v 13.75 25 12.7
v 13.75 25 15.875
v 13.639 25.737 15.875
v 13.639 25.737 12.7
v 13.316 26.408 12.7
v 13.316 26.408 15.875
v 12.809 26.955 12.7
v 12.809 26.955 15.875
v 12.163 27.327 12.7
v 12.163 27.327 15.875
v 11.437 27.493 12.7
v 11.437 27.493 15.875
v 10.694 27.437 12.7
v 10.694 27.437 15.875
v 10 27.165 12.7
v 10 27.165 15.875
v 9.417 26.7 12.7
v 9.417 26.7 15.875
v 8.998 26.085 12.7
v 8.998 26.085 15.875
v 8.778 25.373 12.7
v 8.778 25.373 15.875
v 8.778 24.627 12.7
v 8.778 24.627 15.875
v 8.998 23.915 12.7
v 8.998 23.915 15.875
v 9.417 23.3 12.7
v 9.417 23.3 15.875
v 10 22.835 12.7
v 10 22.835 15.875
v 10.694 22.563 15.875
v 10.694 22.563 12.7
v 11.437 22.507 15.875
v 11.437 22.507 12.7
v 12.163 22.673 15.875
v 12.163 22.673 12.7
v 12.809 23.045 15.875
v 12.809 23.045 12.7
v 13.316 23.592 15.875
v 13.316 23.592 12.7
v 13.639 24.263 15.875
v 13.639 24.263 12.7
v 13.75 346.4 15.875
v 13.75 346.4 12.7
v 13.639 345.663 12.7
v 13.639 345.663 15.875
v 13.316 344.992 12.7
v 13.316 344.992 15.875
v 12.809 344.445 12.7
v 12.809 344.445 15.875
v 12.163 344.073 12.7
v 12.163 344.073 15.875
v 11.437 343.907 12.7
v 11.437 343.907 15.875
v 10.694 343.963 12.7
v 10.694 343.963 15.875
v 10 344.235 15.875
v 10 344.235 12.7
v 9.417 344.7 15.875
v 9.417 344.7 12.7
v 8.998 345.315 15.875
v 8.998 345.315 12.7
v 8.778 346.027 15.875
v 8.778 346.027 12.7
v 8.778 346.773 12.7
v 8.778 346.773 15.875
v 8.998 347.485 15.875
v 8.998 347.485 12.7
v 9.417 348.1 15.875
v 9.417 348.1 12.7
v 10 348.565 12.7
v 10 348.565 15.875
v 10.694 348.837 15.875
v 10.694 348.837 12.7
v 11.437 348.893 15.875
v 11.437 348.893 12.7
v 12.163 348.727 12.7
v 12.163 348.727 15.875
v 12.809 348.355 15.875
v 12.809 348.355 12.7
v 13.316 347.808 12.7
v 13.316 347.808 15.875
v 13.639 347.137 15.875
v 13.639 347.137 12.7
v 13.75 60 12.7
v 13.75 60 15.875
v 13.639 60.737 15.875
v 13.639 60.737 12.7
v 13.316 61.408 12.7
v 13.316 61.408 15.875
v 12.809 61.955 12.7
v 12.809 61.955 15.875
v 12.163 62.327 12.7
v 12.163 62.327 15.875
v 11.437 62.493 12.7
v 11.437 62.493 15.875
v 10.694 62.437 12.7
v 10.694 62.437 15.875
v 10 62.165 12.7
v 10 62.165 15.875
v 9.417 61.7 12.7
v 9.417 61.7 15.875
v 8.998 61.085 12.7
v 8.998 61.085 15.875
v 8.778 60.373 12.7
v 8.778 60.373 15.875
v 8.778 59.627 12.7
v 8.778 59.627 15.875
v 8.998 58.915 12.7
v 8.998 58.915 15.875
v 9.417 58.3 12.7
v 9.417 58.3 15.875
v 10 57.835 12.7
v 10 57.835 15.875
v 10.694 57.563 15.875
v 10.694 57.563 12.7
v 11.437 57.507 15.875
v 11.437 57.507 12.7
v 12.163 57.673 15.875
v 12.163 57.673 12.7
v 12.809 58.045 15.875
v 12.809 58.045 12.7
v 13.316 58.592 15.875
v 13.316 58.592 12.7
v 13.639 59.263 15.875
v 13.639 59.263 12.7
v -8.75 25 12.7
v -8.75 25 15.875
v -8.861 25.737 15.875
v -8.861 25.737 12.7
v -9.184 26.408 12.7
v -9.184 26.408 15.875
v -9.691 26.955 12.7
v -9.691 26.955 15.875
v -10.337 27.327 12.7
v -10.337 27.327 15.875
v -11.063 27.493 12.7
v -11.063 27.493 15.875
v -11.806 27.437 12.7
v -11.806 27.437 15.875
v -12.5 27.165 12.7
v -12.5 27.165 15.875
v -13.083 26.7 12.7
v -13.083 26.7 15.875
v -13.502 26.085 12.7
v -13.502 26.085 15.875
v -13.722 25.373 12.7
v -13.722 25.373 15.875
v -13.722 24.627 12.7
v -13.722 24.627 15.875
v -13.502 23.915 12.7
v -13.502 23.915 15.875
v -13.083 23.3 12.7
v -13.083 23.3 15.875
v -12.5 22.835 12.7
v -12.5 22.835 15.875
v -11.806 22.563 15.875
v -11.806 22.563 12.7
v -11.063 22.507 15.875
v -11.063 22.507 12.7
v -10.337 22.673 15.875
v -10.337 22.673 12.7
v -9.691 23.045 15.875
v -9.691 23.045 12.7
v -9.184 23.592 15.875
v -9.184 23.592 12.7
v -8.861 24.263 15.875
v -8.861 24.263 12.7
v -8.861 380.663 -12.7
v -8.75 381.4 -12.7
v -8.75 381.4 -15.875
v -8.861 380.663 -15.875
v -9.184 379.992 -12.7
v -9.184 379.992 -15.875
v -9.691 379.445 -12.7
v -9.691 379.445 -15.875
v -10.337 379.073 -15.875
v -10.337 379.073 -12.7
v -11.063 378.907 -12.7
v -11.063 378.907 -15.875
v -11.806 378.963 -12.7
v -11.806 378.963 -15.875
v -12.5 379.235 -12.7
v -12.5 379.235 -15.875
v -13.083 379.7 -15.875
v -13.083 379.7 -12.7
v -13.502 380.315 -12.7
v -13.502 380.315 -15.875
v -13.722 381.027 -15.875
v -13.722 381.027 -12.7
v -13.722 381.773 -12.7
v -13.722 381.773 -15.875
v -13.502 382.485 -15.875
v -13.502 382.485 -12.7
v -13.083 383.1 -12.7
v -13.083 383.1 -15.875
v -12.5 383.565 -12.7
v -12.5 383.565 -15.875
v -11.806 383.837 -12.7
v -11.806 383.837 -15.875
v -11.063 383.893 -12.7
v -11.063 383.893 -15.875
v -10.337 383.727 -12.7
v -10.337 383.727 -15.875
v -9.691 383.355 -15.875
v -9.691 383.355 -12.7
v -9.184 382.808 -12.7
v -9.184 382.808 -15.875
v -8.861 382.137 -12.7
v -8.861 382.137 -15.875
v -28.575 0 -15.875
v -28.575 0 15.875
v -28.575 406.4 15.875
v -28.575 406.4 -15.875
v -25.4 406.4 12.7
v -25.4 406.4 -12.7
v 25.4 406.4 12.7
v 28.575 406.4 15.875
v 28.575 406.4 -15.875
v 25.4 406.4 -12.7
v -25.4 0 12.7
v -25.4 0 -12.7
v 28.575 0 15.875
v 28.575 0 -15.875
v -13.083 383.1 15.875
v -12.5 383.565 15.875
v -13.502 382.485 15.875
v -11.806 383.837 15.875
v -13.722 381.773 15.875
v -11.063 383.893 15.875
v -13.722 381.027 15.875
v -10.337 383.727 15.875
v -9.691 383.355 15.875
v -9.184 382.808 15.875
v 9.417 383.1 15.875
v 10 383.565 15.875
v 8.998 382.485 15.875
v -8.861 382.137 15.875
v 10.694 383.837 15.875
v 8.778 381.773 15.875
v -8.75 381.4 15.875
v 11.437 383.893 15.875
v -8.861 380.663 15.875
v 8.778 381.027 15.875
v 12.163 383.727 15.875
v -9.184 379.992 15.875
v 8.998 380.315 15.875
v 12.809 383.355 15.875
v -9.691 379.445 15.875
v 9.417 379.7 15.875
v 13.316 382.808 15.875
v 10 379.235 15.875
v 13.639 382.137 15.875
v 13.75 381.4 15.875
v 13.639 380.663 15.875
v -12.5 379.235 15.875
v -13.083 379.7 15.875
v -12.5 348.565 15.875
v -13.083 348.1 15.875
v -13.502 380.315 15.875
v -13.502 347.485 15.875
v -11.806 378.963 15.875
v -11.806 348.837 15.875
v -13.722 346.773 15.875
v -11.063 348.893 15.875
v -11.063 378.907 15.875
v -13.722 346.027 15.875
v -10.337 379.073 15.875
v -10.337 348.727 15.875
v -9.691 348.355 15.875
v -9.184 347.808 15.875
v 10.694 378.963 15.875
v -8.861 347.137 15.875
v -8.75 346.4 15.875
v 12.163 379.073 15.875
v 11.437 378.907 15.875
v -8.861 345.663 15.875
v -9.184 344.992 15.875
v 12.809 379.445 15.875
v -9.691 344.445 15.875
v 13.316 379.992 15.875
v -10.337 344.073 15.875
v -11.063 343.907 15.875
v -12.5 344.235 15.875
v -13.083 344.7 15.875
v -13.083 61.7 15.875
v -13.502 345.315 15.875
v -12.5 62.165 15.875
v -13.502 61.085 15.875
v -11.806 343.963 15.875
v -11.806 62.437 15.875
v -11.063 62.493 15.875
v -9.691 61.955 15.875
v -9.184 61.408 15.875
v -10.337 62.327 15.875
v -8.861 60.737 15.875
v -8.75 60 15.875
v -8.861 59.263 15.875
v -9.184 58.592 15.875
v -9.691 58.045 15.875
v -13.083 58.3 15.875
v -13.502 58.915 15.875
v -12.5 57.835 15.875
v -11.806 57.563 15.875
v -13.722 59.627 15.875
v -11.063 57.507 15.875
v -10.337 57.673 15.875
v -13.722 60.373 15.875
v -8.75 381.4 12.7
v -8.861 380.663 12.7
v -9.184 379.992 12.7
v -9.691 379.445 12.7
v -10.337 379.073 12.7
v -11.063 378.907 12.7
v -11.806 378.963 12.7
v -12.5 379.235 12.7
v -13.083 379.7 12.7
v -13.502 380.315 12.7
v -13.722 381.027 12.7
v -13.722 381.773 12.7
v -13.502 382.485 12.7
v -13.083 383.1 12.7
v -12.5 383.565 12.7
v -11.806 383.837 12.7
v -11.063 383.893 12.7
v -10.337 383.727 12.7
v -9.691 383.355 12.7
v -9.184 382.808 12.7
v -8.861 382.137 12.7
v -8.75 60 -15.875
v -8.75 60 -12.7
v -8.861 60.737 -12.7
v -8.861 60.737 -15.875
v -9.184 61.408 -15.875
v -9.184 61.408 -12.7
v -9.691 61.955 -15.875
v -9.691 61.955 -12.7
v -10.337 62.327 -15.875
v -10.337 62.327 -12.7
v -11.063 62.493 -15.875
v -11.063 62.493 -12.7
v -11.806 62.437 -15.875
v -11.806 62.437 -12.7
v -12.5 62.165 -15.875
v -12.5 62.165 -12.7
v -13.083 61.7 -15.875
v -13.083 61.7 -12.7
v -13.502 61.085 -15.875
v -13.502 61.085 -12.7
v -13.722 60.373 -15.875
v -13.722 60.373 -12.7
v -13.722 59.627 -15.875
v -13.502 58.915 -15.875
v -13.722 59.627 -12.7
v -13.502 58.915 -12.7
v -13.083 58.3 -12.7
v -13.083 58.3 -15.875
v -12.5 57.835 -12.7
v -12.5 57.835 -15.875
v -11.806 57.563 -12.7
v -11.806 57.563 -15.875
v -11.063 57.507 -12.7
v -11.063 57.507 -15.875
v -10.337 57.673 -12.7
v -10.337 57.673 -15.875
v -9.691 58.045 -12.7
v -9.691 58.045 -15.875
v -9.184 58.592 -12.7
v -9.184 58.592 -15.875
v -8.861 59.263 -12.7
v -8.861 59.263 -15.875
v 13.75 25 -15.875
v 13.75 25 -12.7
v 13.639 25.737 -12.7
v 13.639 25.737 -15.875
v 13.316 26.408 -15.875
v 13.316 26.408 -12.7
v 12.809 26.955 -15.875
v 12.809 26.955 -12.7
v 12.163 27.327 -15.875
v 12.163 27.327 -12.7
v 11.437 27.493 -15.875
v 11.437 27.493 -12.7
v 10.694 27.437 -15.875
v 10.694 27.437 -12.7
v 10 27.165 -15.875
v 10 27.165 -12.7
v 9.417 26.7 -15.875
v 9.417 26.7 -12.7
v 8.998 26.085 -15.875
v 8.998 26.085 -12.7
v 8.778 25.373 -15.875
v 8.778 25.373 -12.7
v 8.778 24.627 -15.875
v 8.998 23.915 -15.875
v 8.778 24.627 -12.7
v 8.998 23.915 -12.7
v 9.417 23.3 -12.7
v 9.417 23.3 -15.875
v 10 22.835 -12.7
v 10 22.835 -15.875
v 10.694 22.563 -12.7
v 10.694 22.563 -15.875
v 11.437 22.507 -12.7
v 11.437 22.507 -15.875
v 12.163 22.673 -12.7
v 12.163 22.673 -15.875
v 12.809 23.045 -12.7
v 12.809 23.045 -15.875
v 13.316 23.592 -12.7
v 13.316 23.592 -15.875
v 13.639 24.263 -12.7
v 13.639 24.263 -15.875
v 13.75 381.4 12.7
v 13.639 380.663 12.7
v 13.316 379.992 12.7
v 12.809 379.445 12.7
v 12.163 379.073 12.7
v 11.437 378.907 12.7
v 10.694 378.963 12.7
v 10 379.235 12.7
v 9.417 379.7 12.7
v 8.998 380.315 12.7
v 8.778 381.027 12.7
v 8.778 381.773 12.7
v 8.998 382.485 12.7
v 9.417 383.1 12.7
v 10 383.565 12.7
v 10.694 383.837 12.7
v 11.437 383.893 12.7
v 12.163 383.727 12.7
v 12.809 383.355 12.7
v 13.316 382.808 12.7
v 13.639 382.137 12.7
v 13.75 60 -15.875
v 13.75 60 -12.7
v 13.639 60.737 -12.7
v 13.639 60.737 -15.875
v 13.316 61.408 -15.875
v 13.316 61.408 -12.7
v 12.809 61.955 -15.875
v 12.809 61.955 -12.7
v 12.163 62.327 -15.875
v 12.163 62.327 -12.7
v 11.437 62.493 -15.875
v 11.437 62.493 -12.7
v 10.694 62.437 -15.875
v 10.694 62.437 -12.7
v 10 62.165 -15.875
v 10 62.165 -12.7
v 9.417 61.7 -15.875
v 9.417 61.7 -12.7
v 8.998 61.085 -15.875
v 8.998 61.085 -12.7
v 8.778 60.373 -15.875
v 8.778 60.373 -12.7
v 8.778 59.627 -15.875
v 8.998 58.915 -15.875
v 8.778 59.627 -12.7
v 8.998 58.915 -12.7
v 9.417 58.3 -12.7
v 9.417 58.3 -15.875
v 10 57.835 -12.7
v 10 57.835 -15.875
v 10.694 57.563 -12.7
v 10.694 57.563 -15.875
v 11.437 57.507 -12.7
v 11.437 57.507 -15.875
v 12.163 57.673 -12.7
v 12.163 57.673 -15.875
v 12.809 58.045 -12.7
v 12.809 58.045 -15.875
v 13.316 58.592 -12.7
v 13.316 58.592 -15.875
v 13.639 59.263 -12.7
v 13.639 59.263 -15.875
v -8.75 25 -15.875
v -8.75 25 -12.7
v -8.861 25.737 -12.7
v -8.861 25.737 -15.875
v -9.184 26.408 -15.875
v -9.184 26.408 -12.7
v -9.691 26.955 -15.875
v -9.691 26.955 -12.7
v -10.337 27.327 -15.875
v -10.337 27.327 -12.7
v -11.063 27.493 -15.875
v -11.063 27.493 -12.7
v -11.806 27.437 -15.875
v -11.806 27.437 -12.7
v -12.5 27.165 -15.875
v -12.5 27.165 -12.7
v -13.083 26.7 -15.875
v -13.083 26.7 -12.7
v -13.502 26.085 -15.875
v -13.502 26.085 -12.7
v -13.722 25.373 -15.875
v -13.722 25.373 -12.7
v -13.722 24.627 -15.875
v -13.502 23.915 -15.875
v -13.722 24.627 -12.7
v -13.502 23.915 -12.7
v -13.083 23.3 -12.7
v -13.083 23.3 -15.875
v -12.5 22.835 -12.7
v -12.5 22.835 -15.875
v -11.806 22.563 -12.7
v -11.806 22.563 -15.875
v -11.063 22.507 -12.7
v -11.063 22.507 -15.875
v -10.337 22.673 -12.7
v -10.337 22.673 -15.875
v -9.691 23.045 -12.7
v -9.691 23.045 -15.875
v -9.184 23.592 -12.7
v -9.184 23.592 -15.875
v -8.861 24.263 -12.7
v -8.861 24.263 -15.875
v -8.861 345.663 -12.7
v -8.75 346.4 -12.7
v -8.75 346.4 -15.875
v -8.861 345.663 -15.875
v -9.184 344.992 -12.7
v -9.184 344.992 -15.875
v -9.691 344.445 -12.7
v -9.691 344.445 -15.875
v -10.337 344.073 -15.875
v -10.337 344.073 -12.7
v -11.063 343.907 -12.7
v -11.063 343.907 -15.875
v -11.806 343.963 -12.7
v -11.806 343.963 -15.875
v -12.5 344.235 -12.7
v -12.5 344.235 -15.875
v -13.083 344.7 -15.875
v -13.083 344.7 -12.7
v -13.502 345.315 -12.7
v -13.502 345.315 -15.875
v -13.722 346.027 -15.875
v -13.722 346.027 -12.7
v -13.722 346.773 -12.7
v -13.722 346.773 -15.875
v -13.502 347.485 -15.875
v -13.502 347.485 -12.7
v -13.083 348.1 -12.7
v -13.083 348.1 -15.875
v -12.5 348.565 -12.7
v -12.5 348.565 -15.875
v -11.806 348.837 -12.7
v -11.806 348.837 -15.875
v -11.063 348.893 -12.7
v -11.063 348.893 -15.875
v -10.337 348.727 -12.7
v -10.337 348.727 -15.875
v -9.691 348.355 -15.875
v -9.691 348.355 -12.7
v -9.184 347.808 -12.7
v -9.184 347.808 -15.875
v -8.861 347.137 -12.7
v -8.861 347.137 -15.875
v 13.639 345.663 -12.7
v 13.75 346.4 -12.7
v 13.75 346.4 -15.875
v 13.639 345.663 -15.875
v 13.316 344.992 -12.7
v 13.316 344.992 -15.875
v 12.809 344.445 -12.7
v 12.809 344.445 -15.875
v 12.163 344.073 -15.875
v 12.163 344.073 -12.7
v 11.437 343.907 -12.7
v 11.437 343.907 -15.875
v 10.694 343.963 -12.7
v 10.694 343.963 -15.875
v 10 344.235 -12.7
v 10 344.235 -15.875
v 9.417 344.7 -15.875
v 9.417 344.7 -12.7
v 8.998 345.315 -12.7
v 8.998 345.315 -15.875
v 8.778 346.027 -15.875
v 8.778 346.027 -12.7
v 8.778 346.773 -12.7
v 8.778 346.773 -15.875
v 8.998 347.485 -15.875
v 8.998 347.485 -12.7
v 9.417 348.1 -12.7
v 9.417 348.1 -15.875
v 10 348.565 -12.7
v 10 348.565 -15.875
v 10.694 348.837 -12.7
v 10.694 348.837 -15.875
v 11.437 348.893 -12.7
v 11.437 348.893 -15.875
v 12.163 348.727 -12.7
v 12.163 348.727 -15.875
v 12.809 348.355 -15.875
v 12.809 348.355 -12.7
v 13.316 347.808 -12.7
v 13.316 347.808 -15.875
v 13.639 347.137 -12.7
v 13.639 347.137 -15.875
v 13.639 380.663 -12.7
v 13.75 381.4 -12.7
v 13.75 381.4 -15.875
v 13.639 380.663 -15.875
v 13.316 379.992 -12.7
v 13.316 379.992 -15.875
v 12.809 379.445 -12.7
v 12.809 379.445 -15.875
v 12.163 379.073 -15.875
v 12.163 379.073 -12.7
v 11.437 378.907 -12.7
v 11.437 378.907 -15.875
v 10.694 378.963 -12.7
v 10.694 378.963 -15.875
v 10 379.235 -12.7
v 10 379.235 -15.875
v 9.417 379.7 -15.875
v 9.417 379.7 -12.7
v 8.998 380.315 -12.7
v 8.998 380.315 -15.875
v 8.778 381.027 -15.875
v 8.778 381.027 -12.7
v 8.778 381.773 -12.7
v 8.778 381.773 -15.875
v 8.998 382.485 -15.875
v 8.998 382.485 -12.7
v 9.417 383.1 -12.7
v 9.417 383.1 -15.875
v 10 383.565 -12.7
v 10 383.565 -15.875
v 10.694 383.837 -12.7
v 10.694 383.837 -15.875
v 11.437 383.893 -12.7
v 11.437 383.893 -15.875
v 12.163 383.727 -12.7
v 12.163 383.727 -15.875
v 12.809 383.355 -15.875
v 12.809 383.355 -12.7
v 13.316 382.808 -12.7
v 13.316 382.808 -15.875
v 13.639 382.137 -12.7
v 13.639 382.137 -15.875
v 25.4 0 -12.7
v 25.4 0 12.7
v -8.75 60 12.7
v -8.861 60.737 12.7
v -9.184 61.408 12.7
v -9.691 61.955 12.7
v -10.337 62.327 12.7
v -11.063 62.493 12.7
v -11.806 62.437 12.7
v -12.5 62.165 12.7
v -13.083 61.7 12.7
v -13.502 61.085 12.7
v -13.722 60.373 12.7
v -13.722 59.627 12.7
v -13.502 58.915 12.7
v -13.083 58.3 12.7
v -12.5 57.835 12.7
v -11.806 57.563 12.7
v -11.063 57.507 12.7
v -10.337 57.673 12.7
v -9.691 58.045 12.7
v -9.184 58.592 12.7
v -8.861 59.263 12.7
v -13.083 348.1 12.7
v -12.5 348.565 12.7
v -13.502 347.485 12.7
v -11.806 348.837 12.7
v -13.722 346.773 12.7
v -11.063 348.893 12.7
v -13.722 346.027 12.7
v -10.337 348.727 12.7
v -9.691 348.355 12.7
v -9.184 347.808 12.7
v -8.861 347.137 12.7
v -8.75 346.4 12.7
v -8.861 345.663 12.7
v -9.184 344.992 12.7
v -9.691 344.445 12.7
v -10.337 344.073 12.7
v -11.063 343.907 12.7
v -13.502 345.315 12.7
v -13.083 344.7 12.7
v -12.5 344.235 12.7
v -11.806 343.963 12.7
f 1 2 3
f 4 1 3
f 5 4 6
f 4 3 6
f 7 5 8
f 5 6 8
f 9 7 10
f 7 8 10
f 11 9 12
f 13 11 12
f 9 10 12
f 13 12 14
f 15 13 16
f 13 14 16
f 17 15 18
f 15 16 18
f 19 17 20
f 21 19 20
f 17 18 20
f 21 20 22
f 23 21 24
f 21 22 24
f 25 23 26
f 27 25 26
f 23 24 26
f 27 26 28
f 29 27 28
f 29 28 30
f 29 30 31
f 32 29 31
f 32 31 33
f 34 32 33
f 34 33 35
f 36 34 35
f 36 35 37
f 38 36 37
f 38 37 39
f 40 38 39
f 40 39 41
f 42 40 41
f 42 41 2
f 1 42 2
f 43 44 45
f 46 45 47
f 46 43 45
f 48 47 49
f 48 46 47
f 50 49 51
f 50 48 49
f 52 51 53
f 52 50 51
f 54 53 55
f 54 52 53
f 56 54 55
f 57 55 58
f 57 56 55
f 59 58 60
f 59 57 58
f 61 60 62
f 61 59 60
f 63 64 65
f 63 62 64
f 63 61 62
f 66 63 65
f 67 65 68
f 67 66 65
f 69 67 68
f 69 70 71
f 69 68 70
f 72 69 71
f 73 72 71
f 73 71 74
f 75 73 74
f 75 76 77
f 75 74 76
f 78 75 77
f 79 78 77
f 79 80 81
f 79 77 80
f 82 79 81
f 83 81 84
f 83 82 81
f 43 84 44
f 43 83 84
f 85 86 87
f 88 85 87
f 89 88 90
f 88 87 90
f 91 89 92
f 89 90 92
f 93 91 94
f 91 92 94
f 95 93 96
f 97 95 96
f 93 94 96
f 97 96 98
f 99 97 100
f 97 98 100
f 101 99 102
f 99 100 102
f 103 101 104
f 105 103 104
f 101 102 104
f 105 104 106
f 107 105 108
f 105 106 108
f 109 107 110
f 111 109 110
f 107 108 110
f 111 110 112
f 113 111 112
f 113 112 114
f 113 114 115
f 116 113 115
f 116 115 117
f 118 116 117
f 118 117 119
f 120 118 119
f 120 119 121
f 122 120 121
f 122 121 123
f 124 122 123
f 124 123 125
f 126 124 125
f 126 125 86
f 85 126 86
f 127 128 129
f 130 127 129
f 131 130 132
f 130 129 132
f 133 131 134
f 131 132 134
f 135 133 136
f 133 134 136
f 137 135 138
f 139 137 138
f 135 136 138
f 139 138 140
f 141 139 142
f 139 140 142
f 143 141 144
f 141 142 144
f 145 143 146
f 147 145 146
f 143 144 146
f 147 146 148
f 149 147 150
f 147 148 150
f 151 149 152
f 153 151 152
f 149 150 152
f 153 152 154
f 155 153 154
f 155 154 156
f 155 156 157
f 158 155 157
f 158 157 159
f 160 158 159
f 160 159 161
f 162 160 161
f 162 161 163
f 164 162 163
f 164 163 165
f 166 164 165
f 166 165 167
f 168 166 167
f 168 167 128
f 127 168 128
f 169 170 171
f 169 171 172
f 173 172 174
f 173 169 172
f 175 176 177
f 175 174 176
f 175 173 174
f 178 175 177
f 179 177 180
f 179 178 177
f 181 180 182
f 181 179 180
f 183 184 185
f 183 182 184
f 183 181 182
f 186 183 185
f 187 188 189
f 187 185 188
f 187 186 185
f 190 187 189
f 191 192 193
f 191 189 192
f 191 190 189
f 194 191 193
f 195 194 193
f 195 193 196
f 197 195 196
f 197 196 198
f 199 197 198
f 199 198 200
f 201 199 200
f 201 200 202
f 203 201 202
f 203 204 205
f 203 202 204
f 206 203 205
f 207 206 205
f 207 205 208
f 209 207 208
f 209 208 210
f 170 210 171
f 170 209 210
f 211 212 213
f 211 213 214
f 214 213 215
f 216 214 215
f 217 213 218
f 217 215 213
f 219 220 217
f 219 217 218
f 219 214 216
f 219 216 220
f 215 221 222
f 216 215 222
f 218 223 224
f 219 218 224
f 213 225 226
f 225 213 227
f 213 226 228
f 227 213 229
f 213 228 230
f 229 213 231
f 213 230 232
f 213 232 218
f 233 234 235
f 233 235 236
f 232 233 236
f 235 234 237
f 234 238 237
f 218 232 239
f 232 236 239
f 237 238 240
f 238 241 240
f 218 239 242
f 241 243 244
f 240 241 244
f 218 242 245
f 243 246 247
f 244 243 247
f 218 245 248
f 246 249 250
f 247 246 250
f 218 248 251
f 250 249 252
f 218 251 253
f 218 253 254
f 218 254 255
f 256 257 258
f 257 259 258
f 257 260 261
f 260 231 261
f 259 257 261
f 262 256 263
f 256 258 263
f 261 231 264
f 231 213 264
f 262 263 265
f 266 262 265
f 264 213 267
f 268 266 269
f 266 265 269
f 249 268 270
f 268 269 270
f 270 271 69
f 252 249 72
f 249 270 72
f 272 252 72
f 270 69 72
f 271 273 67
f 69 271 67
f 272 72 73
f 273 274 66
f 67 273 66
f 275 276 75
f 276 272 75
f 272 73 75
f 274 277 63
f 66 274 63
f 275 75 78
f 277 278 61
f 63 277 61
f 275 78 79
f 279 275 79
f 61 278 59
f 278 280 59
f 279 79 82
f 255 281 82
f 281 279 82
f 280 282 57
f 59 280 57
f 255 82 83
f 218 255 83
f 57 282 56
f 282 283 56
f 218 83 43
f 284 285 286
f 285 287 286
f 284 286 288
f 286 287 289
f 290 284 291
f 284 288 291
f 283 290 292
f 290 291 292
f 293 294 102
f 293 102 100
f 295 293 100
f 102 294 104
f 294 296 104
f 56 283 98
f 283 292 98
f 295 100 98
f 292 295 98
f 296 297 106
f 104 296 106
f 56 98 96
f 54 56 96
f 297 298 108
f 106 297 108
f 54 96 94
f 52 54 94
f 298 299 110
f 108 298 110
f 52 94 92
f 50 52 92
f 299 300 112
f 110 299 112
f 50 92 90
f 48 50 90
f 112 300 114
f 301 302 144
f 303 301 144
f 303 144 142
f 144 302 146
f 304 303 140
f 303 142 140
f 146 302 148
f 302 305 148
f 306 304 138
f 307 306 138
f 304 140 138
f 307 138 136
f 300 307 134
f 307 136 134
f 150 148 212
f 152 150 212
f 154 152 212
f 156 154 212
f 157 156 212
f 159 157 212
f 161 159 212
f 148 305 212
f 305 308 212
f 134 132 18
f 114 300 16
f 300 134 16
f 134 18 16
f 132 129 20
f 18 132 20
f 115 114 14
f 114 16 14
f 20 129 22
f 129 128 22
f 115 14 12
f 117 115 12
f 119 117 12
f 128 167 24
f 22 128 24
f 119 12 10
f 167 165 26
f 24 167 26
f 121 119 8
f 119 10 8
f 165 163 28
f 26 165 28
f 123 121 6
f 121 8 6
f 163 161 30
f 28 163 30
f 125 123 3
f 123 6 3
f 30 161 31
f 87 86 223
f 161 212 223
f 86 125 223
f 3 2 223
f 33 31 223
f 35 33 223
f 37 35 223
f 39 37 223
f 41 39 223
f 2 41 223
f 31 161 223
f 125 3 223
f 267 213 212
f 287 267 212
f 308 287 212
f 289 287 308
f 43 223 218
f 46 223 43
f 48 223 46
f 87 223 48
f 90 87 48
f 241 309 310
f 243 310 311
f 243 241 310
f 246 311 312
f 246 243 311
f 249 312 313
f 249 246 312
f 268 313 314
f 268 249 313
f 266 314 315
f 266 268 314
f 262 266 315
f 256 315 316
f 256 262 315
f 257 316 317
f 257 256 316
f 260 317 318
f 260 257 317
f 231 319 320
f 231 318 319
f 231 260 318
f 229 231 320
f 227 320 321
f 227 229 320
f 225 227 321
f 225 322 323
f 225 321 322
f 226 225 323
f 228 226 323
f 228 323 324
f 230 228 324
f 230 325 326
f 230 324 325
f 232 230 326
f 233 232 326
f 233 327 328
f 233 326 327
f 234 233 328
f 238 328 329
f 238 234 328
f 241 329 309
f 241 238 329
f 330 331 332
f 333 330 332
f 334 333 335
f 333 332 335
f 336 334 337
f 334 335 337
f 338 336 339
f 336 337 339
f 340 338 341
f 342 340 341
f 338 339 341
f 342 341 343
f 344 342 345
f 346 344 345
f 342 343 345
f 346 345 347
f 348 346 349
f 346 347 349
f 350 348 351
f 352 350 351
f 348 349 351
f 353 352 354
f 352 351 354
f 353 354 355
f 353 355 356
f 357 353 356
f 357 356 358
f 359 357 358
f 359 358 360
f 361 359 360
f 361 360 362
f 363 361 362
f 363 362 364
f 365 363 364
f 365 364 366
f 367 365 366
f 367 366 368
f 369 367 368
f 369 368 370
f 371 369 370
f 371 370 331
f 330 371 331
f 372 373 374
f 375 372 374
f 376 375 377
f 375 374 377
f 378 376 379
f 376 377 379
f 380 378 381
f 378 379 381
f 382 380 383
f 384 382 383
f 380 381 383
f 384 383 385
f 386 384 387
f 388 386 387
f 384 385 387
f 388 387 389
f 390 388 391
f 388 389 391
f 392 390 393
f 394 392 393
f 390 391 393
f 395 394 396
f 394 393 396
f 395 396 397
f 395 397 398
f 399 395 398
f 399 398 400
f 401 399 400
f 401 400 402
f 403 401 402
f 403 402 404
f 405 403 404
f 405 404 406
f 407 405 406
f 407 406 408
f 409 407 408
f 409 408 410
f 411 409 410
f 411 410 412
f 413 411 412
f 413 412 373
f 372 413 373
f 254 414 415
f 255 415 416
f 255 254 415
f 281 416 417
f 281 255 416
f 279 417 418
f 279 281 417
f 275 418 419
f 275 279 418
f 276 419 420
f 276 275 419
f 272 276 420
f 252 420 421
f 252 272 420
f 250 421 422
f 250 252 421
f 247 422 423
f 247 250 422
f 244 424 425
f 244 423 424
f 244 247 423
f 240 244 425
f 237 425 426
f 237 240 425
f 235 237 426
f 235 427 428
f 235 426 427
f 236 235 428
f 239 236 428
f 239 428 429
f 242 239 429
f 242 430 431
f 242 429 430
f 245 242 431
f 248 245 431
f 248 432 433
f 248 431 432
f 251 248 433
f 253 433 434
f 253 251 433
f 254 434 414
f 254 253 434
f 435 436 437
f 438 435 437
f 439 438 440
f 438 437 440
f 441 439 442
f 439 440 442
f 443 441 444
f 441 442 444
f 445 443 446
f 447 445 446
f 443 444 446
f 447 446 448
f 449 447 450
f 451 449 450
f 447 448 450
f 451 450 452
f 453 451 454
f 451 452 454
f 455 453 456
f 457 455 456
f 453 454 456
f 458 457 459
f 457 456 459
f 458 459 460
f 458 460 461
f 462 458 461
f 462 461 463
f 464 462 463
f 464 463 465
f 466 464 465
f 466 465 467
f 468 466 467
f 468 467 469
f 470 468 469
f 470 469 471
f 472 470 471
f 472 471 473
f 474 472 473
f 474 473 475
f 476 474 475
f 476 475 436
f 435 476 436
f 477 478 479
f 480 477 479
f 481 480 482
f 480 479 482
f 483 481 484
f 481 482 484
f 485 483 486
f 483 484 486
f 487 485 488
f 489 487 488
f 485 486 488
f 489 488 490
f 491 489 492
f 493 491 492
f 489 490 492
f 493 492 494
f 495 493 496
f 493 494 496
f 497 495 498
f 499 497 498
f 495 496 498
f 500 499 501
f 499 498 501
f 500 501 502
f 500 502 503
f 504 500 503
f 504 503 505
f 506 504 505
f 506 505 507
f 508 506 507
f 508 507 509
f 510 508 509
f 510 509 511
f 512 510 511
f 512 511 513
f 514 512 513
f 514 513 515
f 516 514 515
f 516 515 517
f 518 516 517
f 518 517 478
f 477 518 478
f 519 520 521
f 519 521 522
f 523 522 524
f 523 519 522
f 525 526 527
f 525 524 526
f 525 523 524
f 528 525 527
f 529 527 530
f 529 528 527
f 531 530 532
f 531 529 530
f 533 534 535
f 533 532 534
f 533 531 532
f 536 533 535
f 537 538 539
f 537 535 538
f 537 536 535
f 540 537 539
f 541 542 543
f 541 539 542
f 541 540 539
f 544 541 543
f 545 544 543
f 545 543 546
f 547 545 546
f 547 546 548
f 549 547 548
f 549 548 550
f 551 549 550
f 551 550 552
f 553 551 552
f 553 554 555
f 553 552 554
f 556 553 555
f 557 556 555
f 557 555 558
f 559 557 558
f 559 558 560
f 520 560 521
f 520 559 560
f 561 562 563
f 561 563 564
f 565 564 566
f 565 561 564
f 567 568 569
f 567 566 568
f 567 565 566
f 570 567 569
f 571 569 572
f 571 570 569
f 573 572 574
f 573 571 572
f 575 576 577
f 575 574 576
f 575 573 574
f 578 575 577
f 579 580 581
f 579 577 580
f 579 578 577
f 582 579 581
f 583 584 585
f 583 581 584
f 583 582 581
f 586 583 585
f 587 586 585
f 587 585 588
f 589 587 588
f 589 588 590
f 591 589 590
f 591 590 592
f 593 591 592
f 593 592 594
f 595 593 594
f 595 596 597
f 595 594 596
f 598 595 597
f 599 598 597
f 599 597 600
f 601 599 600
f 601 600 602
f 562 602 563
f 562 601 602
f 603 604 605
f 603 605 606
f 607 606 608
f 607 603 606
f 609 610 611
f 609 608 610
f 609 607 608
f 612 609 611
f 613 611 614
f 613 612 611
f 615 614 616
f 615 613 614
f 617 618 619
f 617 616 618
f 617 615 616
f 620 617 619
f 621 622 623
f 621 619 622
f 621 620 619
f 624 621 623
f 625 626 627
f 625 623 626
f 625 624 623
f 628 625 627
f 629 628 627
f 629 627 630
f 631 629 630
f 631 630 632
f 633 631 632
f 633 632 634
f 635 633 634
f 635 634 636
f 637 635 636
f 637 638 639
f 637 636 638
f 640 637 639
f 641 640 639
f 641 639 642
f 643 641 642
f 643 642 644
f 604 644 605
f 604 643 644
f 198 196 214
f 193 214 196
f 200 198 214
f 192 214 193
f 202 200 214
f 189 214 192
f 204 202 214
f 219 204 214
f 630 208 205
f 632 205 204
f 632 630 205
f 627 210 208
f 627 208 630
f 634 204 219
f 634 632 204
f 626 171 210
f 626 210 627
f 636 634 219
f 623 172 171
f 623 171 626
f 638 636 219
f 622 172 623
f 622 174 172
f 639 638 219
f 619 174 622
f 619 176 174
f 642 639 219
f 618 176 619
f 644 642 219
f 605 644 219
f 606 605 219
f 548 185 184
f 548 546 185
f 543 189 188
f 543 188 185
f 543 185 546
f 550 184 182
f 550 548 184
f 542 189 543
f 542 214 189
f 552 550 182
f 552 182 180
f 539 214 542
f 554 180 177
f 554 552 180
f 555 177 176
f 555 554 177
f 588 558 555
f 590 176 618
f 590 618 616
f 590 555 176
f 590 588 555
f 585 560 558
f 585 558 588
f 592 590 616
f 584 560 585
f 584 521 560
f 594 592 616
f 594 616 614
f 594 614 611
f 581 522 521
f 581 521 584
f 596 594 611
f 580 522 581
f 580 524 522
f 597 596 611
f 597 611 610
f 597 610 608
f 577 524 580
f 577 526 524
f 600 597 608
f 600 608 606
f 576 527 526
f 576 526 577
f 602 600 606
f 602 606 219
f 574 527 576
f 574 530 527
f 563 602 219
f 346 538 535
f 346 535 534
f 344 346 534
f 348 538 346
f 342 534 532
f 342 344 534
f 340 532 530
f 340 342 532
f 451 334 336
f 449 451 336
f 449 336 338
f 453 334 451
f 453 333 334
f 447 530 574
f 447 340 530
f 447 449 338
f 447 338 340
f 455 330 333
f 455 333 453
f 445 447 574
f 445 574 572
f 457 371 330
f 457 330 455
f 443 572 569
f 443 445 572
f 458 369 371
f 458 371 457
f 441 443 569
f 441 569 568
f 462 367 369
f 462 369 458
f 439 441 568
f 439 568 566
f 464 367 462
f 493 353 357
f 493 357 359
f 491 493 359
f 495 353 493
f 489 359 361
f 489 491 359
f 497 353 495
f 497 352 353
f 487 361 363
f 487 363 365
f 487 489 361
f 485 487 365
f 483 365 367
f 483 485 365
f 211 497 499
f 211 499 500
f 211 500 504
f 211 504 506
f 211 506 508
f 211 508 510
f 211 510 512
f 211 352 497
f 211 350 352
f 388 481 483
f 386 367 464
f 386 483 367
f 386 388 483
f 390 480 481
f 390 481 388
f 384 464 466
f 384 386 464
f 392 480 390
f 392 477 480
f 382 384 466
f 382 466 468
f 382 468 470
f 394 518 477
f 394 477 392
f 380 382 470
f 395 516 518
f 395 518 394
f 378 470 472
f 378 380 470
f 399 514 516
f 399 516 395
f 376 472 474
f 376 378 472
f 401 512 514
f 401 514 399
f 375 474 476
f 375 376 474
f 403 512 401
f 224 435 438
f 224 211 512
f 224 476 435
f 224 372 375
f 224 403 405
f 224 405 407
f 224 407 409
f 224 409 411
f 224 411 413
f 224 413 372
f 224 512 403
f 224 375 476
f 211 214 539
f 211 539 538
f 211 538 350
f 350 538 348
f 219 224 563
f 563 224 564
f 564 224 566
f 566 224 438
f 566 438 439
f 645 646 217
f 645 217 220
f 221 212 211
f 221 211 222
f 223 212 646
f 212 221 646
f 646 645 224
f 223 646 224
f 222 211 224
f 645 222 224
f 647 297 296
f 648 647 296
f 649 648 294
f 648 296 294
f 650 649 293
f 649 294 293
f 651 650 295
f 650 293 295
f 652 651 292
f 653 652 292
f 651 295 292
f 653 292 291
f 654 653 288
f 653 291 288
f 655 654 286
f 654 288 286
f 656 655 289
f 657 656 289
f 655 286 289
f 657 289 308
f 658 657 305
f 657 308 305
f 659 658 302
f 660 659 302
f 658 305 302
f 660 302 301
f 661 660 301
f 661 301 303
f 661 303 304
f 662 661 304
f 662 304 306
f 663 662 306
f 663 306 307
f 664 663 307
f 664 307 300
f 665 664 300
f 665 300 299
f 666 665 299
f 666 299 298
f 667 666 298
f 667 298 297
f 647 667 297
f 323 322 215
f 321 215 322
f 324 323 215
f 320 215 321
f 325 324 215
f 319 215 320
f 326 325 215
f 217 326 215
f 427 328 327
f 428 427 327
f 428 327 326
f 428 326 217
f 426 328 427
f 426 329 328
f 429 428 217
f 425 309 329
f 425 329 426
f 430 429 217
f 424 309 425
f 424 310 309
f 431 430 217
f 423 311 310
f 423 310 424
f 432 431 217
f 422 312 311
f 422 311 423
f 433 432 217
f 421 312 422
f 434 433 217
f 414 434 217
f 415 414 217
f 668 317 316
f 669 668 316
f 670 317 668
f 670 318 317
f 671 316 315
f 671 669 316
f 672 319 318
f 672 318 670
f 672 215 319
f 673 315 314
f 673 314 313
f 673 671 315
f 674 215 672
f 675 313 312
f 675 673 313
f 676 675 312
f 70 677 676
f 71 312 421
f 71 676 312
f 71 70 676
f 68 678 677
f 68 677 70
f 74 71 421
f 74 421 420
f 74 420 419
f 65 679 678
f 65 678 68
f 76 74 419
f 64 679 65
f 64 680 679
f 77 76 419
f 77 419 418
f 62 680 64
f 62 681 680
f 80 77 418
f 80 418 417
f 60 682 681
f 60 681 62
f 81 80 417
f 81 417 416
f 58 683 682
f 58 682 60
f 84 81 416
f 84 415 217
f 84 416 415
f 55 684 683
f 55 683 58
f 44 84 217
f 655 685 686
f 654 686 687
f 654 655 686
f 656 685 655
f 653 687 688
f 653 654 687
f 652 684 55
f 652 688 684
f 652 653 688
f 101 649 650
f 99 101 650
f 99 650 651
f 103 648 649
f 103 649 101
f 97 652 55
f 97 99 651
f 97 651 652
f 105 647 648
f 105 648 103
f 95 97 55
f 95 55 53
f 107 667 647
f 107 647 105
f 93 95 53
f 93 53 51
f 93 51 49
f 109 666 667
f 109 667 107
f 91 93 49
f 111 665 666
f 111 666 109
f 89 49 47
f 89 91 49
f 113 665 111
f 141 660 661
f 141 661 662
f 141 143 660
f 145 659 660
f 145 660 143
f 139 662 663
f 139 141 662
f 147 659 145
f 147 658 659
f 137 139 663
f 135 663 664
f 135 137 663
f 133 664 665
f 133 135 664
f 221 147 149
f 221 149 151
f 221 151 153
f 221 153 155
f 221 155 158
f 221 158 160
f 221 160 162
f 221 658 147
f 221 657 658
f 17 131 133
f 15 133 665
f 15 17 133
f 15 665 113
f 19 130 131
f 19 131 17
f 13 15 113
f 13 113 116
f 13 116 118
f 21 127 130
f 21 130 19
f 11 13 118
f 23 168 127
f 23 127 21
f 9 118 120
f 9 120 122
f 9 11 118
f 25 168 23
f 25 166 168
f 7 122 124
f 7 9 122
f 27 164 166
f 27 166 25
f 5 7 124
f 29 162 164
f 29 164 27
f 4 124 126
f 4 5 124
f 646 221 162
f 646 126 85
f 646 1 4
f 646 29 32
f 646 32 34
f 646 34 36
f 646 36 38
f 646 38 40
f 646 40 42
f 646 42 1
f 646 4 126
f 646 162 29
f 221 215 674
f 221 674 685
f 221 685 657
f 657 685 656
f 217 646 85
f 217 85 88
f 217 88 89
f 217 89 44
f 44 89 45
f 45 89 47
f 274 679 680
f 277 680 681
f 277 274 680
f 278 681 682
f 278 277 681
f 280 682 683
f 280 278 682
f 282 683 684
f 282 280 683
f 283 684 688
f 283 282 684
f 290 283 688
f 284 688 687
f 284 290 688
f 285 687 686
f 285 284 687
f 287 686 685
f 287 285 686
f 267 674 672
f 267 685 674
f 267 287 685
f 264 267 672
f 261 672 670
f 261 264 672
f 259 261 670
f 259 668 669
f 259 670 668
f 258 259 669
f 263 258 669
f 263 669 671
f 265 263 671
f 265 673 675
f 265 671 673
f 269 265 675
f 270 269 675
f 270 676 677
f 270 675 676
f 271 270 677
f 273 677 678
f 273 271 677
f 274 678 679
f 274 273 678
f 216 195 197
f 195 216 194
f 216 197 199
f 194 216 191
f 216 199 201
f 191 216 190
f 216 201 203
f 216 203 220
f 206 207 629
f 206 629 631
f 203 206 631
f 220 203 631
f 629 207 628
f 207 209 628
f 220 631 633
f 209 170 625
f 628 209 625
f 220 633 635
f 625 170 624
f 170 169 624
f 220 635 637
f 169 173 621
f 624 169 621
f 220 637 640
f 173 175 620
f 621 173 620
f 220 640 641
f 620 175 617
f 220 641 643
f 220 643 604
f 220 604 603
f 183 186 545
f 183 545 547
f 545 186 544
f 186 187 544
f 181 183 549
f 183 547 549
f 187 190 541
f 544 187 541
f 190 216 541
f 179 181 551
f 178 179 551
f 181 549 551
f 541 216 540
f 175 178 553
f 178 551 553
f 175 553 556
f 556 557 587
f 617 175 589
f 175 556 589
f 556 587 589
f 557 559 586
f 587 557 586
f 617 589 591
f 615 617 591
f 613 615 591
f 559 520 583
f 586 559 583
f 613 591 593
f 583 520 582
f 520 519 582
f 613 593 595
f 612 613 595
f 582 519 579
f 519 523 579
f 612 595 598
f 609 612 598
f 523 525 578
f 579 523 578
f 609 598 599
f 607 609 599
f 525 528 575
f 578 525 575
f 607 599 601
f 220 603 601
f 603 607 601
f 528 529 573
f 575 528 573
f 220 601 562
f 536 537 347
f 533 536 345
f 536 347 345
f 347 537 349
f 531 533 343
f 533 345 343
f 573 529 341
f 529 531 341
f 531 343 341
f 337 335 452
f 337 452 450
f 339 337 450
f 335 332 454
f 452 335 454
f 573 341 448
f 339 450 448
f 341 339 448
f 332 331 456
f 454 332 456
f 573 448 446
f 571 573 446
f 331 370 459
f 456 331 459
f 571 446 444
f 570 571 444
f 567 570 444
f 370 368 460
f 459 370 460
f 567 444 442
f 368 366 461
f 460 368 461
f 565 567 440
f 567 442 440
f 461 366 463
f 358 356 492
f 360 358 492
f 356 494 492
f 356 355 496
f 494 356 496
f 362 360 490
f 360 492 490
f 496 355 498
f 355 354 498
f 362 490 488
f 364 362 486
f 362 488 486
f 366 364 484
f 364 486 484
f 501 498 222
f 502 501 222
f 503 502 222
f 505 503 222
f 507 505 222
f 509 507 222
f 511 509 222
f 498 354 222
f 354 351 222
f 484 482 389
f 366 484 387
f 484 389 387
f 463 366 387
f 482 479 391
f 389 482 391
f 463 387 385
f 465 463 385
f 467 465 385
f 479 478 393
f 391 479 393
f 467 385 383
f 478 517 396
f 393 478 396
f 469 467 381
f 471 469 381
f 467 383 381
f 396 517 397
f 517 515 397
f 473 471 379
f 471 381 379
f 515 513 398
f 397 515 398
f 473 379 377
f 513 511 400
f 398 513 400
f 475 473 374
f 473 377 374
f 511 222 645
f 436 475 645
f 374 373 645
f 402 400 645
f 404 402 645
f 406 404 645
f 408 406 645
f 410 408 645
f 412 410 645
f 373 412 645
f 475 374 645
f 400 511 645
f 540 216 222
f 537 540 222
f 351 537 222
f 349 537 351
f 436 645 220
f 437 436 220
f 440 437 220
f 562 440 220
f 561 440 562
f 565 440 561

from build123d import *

# Parameters (mm, degrees)
SKETCH1_W           = 57.15
SKETCH1_H           = 31.75
SKETCH1_W_2         = 50.8
SKETCH1_H_2         = 25.4
BOSS_EXTRUDE1_DEPTH = 406.4
SKETCH2_R           = 2.5
CUT_EXTRUDE1_DEPTH  = 409.638658383


with BuildPart() as part:
    # Sketch1 → Boss-Extrude1 (new body)
    with BuildSketch(Plane(origin=(0, 0, 0), x_dir=(1, 0, 0), z_dir=(0, 1, 0))):
        Rectangle(SKETCH1_W, SKETCH1_H)
        Rectangle(SKETCH1_W_2, SKETCH1_H_2, mode=Mode.SUBTRACT)
    extrude(amount=BOSS_EXTRUDE1_DEPTH)

    # Sketch2 → Cut-Extrude1 (cut, through all)
    with BuildSketch(Plane.XY.offset(15.875)):
        with Locations((-11.25, 60)):
            Circle(SKETCH2_R)
        with Locations((-11.25, 25)):
            Circle(SKETCH2_R)
        with Locations((11.25, 25)):
            Circle(SKETCH2_R)
        with Locations((11.25, 60)):
            Circle(SKETCH2_R)
    cut_extrude1 = extrude(amount=-CUT_EXTRUDE1_DEPTH, mode=Mode.SUBTRACT)

    # Mirror1: Cut-Extrude1 across plane
    add(cut_extrude1.mirror(Plane(origin=(0, 203.2, 0), x_dir=(0, 0, 1), z_dir=(0, -1, 0))), mode=Mode.SUBTRACT)


solid = part.part
